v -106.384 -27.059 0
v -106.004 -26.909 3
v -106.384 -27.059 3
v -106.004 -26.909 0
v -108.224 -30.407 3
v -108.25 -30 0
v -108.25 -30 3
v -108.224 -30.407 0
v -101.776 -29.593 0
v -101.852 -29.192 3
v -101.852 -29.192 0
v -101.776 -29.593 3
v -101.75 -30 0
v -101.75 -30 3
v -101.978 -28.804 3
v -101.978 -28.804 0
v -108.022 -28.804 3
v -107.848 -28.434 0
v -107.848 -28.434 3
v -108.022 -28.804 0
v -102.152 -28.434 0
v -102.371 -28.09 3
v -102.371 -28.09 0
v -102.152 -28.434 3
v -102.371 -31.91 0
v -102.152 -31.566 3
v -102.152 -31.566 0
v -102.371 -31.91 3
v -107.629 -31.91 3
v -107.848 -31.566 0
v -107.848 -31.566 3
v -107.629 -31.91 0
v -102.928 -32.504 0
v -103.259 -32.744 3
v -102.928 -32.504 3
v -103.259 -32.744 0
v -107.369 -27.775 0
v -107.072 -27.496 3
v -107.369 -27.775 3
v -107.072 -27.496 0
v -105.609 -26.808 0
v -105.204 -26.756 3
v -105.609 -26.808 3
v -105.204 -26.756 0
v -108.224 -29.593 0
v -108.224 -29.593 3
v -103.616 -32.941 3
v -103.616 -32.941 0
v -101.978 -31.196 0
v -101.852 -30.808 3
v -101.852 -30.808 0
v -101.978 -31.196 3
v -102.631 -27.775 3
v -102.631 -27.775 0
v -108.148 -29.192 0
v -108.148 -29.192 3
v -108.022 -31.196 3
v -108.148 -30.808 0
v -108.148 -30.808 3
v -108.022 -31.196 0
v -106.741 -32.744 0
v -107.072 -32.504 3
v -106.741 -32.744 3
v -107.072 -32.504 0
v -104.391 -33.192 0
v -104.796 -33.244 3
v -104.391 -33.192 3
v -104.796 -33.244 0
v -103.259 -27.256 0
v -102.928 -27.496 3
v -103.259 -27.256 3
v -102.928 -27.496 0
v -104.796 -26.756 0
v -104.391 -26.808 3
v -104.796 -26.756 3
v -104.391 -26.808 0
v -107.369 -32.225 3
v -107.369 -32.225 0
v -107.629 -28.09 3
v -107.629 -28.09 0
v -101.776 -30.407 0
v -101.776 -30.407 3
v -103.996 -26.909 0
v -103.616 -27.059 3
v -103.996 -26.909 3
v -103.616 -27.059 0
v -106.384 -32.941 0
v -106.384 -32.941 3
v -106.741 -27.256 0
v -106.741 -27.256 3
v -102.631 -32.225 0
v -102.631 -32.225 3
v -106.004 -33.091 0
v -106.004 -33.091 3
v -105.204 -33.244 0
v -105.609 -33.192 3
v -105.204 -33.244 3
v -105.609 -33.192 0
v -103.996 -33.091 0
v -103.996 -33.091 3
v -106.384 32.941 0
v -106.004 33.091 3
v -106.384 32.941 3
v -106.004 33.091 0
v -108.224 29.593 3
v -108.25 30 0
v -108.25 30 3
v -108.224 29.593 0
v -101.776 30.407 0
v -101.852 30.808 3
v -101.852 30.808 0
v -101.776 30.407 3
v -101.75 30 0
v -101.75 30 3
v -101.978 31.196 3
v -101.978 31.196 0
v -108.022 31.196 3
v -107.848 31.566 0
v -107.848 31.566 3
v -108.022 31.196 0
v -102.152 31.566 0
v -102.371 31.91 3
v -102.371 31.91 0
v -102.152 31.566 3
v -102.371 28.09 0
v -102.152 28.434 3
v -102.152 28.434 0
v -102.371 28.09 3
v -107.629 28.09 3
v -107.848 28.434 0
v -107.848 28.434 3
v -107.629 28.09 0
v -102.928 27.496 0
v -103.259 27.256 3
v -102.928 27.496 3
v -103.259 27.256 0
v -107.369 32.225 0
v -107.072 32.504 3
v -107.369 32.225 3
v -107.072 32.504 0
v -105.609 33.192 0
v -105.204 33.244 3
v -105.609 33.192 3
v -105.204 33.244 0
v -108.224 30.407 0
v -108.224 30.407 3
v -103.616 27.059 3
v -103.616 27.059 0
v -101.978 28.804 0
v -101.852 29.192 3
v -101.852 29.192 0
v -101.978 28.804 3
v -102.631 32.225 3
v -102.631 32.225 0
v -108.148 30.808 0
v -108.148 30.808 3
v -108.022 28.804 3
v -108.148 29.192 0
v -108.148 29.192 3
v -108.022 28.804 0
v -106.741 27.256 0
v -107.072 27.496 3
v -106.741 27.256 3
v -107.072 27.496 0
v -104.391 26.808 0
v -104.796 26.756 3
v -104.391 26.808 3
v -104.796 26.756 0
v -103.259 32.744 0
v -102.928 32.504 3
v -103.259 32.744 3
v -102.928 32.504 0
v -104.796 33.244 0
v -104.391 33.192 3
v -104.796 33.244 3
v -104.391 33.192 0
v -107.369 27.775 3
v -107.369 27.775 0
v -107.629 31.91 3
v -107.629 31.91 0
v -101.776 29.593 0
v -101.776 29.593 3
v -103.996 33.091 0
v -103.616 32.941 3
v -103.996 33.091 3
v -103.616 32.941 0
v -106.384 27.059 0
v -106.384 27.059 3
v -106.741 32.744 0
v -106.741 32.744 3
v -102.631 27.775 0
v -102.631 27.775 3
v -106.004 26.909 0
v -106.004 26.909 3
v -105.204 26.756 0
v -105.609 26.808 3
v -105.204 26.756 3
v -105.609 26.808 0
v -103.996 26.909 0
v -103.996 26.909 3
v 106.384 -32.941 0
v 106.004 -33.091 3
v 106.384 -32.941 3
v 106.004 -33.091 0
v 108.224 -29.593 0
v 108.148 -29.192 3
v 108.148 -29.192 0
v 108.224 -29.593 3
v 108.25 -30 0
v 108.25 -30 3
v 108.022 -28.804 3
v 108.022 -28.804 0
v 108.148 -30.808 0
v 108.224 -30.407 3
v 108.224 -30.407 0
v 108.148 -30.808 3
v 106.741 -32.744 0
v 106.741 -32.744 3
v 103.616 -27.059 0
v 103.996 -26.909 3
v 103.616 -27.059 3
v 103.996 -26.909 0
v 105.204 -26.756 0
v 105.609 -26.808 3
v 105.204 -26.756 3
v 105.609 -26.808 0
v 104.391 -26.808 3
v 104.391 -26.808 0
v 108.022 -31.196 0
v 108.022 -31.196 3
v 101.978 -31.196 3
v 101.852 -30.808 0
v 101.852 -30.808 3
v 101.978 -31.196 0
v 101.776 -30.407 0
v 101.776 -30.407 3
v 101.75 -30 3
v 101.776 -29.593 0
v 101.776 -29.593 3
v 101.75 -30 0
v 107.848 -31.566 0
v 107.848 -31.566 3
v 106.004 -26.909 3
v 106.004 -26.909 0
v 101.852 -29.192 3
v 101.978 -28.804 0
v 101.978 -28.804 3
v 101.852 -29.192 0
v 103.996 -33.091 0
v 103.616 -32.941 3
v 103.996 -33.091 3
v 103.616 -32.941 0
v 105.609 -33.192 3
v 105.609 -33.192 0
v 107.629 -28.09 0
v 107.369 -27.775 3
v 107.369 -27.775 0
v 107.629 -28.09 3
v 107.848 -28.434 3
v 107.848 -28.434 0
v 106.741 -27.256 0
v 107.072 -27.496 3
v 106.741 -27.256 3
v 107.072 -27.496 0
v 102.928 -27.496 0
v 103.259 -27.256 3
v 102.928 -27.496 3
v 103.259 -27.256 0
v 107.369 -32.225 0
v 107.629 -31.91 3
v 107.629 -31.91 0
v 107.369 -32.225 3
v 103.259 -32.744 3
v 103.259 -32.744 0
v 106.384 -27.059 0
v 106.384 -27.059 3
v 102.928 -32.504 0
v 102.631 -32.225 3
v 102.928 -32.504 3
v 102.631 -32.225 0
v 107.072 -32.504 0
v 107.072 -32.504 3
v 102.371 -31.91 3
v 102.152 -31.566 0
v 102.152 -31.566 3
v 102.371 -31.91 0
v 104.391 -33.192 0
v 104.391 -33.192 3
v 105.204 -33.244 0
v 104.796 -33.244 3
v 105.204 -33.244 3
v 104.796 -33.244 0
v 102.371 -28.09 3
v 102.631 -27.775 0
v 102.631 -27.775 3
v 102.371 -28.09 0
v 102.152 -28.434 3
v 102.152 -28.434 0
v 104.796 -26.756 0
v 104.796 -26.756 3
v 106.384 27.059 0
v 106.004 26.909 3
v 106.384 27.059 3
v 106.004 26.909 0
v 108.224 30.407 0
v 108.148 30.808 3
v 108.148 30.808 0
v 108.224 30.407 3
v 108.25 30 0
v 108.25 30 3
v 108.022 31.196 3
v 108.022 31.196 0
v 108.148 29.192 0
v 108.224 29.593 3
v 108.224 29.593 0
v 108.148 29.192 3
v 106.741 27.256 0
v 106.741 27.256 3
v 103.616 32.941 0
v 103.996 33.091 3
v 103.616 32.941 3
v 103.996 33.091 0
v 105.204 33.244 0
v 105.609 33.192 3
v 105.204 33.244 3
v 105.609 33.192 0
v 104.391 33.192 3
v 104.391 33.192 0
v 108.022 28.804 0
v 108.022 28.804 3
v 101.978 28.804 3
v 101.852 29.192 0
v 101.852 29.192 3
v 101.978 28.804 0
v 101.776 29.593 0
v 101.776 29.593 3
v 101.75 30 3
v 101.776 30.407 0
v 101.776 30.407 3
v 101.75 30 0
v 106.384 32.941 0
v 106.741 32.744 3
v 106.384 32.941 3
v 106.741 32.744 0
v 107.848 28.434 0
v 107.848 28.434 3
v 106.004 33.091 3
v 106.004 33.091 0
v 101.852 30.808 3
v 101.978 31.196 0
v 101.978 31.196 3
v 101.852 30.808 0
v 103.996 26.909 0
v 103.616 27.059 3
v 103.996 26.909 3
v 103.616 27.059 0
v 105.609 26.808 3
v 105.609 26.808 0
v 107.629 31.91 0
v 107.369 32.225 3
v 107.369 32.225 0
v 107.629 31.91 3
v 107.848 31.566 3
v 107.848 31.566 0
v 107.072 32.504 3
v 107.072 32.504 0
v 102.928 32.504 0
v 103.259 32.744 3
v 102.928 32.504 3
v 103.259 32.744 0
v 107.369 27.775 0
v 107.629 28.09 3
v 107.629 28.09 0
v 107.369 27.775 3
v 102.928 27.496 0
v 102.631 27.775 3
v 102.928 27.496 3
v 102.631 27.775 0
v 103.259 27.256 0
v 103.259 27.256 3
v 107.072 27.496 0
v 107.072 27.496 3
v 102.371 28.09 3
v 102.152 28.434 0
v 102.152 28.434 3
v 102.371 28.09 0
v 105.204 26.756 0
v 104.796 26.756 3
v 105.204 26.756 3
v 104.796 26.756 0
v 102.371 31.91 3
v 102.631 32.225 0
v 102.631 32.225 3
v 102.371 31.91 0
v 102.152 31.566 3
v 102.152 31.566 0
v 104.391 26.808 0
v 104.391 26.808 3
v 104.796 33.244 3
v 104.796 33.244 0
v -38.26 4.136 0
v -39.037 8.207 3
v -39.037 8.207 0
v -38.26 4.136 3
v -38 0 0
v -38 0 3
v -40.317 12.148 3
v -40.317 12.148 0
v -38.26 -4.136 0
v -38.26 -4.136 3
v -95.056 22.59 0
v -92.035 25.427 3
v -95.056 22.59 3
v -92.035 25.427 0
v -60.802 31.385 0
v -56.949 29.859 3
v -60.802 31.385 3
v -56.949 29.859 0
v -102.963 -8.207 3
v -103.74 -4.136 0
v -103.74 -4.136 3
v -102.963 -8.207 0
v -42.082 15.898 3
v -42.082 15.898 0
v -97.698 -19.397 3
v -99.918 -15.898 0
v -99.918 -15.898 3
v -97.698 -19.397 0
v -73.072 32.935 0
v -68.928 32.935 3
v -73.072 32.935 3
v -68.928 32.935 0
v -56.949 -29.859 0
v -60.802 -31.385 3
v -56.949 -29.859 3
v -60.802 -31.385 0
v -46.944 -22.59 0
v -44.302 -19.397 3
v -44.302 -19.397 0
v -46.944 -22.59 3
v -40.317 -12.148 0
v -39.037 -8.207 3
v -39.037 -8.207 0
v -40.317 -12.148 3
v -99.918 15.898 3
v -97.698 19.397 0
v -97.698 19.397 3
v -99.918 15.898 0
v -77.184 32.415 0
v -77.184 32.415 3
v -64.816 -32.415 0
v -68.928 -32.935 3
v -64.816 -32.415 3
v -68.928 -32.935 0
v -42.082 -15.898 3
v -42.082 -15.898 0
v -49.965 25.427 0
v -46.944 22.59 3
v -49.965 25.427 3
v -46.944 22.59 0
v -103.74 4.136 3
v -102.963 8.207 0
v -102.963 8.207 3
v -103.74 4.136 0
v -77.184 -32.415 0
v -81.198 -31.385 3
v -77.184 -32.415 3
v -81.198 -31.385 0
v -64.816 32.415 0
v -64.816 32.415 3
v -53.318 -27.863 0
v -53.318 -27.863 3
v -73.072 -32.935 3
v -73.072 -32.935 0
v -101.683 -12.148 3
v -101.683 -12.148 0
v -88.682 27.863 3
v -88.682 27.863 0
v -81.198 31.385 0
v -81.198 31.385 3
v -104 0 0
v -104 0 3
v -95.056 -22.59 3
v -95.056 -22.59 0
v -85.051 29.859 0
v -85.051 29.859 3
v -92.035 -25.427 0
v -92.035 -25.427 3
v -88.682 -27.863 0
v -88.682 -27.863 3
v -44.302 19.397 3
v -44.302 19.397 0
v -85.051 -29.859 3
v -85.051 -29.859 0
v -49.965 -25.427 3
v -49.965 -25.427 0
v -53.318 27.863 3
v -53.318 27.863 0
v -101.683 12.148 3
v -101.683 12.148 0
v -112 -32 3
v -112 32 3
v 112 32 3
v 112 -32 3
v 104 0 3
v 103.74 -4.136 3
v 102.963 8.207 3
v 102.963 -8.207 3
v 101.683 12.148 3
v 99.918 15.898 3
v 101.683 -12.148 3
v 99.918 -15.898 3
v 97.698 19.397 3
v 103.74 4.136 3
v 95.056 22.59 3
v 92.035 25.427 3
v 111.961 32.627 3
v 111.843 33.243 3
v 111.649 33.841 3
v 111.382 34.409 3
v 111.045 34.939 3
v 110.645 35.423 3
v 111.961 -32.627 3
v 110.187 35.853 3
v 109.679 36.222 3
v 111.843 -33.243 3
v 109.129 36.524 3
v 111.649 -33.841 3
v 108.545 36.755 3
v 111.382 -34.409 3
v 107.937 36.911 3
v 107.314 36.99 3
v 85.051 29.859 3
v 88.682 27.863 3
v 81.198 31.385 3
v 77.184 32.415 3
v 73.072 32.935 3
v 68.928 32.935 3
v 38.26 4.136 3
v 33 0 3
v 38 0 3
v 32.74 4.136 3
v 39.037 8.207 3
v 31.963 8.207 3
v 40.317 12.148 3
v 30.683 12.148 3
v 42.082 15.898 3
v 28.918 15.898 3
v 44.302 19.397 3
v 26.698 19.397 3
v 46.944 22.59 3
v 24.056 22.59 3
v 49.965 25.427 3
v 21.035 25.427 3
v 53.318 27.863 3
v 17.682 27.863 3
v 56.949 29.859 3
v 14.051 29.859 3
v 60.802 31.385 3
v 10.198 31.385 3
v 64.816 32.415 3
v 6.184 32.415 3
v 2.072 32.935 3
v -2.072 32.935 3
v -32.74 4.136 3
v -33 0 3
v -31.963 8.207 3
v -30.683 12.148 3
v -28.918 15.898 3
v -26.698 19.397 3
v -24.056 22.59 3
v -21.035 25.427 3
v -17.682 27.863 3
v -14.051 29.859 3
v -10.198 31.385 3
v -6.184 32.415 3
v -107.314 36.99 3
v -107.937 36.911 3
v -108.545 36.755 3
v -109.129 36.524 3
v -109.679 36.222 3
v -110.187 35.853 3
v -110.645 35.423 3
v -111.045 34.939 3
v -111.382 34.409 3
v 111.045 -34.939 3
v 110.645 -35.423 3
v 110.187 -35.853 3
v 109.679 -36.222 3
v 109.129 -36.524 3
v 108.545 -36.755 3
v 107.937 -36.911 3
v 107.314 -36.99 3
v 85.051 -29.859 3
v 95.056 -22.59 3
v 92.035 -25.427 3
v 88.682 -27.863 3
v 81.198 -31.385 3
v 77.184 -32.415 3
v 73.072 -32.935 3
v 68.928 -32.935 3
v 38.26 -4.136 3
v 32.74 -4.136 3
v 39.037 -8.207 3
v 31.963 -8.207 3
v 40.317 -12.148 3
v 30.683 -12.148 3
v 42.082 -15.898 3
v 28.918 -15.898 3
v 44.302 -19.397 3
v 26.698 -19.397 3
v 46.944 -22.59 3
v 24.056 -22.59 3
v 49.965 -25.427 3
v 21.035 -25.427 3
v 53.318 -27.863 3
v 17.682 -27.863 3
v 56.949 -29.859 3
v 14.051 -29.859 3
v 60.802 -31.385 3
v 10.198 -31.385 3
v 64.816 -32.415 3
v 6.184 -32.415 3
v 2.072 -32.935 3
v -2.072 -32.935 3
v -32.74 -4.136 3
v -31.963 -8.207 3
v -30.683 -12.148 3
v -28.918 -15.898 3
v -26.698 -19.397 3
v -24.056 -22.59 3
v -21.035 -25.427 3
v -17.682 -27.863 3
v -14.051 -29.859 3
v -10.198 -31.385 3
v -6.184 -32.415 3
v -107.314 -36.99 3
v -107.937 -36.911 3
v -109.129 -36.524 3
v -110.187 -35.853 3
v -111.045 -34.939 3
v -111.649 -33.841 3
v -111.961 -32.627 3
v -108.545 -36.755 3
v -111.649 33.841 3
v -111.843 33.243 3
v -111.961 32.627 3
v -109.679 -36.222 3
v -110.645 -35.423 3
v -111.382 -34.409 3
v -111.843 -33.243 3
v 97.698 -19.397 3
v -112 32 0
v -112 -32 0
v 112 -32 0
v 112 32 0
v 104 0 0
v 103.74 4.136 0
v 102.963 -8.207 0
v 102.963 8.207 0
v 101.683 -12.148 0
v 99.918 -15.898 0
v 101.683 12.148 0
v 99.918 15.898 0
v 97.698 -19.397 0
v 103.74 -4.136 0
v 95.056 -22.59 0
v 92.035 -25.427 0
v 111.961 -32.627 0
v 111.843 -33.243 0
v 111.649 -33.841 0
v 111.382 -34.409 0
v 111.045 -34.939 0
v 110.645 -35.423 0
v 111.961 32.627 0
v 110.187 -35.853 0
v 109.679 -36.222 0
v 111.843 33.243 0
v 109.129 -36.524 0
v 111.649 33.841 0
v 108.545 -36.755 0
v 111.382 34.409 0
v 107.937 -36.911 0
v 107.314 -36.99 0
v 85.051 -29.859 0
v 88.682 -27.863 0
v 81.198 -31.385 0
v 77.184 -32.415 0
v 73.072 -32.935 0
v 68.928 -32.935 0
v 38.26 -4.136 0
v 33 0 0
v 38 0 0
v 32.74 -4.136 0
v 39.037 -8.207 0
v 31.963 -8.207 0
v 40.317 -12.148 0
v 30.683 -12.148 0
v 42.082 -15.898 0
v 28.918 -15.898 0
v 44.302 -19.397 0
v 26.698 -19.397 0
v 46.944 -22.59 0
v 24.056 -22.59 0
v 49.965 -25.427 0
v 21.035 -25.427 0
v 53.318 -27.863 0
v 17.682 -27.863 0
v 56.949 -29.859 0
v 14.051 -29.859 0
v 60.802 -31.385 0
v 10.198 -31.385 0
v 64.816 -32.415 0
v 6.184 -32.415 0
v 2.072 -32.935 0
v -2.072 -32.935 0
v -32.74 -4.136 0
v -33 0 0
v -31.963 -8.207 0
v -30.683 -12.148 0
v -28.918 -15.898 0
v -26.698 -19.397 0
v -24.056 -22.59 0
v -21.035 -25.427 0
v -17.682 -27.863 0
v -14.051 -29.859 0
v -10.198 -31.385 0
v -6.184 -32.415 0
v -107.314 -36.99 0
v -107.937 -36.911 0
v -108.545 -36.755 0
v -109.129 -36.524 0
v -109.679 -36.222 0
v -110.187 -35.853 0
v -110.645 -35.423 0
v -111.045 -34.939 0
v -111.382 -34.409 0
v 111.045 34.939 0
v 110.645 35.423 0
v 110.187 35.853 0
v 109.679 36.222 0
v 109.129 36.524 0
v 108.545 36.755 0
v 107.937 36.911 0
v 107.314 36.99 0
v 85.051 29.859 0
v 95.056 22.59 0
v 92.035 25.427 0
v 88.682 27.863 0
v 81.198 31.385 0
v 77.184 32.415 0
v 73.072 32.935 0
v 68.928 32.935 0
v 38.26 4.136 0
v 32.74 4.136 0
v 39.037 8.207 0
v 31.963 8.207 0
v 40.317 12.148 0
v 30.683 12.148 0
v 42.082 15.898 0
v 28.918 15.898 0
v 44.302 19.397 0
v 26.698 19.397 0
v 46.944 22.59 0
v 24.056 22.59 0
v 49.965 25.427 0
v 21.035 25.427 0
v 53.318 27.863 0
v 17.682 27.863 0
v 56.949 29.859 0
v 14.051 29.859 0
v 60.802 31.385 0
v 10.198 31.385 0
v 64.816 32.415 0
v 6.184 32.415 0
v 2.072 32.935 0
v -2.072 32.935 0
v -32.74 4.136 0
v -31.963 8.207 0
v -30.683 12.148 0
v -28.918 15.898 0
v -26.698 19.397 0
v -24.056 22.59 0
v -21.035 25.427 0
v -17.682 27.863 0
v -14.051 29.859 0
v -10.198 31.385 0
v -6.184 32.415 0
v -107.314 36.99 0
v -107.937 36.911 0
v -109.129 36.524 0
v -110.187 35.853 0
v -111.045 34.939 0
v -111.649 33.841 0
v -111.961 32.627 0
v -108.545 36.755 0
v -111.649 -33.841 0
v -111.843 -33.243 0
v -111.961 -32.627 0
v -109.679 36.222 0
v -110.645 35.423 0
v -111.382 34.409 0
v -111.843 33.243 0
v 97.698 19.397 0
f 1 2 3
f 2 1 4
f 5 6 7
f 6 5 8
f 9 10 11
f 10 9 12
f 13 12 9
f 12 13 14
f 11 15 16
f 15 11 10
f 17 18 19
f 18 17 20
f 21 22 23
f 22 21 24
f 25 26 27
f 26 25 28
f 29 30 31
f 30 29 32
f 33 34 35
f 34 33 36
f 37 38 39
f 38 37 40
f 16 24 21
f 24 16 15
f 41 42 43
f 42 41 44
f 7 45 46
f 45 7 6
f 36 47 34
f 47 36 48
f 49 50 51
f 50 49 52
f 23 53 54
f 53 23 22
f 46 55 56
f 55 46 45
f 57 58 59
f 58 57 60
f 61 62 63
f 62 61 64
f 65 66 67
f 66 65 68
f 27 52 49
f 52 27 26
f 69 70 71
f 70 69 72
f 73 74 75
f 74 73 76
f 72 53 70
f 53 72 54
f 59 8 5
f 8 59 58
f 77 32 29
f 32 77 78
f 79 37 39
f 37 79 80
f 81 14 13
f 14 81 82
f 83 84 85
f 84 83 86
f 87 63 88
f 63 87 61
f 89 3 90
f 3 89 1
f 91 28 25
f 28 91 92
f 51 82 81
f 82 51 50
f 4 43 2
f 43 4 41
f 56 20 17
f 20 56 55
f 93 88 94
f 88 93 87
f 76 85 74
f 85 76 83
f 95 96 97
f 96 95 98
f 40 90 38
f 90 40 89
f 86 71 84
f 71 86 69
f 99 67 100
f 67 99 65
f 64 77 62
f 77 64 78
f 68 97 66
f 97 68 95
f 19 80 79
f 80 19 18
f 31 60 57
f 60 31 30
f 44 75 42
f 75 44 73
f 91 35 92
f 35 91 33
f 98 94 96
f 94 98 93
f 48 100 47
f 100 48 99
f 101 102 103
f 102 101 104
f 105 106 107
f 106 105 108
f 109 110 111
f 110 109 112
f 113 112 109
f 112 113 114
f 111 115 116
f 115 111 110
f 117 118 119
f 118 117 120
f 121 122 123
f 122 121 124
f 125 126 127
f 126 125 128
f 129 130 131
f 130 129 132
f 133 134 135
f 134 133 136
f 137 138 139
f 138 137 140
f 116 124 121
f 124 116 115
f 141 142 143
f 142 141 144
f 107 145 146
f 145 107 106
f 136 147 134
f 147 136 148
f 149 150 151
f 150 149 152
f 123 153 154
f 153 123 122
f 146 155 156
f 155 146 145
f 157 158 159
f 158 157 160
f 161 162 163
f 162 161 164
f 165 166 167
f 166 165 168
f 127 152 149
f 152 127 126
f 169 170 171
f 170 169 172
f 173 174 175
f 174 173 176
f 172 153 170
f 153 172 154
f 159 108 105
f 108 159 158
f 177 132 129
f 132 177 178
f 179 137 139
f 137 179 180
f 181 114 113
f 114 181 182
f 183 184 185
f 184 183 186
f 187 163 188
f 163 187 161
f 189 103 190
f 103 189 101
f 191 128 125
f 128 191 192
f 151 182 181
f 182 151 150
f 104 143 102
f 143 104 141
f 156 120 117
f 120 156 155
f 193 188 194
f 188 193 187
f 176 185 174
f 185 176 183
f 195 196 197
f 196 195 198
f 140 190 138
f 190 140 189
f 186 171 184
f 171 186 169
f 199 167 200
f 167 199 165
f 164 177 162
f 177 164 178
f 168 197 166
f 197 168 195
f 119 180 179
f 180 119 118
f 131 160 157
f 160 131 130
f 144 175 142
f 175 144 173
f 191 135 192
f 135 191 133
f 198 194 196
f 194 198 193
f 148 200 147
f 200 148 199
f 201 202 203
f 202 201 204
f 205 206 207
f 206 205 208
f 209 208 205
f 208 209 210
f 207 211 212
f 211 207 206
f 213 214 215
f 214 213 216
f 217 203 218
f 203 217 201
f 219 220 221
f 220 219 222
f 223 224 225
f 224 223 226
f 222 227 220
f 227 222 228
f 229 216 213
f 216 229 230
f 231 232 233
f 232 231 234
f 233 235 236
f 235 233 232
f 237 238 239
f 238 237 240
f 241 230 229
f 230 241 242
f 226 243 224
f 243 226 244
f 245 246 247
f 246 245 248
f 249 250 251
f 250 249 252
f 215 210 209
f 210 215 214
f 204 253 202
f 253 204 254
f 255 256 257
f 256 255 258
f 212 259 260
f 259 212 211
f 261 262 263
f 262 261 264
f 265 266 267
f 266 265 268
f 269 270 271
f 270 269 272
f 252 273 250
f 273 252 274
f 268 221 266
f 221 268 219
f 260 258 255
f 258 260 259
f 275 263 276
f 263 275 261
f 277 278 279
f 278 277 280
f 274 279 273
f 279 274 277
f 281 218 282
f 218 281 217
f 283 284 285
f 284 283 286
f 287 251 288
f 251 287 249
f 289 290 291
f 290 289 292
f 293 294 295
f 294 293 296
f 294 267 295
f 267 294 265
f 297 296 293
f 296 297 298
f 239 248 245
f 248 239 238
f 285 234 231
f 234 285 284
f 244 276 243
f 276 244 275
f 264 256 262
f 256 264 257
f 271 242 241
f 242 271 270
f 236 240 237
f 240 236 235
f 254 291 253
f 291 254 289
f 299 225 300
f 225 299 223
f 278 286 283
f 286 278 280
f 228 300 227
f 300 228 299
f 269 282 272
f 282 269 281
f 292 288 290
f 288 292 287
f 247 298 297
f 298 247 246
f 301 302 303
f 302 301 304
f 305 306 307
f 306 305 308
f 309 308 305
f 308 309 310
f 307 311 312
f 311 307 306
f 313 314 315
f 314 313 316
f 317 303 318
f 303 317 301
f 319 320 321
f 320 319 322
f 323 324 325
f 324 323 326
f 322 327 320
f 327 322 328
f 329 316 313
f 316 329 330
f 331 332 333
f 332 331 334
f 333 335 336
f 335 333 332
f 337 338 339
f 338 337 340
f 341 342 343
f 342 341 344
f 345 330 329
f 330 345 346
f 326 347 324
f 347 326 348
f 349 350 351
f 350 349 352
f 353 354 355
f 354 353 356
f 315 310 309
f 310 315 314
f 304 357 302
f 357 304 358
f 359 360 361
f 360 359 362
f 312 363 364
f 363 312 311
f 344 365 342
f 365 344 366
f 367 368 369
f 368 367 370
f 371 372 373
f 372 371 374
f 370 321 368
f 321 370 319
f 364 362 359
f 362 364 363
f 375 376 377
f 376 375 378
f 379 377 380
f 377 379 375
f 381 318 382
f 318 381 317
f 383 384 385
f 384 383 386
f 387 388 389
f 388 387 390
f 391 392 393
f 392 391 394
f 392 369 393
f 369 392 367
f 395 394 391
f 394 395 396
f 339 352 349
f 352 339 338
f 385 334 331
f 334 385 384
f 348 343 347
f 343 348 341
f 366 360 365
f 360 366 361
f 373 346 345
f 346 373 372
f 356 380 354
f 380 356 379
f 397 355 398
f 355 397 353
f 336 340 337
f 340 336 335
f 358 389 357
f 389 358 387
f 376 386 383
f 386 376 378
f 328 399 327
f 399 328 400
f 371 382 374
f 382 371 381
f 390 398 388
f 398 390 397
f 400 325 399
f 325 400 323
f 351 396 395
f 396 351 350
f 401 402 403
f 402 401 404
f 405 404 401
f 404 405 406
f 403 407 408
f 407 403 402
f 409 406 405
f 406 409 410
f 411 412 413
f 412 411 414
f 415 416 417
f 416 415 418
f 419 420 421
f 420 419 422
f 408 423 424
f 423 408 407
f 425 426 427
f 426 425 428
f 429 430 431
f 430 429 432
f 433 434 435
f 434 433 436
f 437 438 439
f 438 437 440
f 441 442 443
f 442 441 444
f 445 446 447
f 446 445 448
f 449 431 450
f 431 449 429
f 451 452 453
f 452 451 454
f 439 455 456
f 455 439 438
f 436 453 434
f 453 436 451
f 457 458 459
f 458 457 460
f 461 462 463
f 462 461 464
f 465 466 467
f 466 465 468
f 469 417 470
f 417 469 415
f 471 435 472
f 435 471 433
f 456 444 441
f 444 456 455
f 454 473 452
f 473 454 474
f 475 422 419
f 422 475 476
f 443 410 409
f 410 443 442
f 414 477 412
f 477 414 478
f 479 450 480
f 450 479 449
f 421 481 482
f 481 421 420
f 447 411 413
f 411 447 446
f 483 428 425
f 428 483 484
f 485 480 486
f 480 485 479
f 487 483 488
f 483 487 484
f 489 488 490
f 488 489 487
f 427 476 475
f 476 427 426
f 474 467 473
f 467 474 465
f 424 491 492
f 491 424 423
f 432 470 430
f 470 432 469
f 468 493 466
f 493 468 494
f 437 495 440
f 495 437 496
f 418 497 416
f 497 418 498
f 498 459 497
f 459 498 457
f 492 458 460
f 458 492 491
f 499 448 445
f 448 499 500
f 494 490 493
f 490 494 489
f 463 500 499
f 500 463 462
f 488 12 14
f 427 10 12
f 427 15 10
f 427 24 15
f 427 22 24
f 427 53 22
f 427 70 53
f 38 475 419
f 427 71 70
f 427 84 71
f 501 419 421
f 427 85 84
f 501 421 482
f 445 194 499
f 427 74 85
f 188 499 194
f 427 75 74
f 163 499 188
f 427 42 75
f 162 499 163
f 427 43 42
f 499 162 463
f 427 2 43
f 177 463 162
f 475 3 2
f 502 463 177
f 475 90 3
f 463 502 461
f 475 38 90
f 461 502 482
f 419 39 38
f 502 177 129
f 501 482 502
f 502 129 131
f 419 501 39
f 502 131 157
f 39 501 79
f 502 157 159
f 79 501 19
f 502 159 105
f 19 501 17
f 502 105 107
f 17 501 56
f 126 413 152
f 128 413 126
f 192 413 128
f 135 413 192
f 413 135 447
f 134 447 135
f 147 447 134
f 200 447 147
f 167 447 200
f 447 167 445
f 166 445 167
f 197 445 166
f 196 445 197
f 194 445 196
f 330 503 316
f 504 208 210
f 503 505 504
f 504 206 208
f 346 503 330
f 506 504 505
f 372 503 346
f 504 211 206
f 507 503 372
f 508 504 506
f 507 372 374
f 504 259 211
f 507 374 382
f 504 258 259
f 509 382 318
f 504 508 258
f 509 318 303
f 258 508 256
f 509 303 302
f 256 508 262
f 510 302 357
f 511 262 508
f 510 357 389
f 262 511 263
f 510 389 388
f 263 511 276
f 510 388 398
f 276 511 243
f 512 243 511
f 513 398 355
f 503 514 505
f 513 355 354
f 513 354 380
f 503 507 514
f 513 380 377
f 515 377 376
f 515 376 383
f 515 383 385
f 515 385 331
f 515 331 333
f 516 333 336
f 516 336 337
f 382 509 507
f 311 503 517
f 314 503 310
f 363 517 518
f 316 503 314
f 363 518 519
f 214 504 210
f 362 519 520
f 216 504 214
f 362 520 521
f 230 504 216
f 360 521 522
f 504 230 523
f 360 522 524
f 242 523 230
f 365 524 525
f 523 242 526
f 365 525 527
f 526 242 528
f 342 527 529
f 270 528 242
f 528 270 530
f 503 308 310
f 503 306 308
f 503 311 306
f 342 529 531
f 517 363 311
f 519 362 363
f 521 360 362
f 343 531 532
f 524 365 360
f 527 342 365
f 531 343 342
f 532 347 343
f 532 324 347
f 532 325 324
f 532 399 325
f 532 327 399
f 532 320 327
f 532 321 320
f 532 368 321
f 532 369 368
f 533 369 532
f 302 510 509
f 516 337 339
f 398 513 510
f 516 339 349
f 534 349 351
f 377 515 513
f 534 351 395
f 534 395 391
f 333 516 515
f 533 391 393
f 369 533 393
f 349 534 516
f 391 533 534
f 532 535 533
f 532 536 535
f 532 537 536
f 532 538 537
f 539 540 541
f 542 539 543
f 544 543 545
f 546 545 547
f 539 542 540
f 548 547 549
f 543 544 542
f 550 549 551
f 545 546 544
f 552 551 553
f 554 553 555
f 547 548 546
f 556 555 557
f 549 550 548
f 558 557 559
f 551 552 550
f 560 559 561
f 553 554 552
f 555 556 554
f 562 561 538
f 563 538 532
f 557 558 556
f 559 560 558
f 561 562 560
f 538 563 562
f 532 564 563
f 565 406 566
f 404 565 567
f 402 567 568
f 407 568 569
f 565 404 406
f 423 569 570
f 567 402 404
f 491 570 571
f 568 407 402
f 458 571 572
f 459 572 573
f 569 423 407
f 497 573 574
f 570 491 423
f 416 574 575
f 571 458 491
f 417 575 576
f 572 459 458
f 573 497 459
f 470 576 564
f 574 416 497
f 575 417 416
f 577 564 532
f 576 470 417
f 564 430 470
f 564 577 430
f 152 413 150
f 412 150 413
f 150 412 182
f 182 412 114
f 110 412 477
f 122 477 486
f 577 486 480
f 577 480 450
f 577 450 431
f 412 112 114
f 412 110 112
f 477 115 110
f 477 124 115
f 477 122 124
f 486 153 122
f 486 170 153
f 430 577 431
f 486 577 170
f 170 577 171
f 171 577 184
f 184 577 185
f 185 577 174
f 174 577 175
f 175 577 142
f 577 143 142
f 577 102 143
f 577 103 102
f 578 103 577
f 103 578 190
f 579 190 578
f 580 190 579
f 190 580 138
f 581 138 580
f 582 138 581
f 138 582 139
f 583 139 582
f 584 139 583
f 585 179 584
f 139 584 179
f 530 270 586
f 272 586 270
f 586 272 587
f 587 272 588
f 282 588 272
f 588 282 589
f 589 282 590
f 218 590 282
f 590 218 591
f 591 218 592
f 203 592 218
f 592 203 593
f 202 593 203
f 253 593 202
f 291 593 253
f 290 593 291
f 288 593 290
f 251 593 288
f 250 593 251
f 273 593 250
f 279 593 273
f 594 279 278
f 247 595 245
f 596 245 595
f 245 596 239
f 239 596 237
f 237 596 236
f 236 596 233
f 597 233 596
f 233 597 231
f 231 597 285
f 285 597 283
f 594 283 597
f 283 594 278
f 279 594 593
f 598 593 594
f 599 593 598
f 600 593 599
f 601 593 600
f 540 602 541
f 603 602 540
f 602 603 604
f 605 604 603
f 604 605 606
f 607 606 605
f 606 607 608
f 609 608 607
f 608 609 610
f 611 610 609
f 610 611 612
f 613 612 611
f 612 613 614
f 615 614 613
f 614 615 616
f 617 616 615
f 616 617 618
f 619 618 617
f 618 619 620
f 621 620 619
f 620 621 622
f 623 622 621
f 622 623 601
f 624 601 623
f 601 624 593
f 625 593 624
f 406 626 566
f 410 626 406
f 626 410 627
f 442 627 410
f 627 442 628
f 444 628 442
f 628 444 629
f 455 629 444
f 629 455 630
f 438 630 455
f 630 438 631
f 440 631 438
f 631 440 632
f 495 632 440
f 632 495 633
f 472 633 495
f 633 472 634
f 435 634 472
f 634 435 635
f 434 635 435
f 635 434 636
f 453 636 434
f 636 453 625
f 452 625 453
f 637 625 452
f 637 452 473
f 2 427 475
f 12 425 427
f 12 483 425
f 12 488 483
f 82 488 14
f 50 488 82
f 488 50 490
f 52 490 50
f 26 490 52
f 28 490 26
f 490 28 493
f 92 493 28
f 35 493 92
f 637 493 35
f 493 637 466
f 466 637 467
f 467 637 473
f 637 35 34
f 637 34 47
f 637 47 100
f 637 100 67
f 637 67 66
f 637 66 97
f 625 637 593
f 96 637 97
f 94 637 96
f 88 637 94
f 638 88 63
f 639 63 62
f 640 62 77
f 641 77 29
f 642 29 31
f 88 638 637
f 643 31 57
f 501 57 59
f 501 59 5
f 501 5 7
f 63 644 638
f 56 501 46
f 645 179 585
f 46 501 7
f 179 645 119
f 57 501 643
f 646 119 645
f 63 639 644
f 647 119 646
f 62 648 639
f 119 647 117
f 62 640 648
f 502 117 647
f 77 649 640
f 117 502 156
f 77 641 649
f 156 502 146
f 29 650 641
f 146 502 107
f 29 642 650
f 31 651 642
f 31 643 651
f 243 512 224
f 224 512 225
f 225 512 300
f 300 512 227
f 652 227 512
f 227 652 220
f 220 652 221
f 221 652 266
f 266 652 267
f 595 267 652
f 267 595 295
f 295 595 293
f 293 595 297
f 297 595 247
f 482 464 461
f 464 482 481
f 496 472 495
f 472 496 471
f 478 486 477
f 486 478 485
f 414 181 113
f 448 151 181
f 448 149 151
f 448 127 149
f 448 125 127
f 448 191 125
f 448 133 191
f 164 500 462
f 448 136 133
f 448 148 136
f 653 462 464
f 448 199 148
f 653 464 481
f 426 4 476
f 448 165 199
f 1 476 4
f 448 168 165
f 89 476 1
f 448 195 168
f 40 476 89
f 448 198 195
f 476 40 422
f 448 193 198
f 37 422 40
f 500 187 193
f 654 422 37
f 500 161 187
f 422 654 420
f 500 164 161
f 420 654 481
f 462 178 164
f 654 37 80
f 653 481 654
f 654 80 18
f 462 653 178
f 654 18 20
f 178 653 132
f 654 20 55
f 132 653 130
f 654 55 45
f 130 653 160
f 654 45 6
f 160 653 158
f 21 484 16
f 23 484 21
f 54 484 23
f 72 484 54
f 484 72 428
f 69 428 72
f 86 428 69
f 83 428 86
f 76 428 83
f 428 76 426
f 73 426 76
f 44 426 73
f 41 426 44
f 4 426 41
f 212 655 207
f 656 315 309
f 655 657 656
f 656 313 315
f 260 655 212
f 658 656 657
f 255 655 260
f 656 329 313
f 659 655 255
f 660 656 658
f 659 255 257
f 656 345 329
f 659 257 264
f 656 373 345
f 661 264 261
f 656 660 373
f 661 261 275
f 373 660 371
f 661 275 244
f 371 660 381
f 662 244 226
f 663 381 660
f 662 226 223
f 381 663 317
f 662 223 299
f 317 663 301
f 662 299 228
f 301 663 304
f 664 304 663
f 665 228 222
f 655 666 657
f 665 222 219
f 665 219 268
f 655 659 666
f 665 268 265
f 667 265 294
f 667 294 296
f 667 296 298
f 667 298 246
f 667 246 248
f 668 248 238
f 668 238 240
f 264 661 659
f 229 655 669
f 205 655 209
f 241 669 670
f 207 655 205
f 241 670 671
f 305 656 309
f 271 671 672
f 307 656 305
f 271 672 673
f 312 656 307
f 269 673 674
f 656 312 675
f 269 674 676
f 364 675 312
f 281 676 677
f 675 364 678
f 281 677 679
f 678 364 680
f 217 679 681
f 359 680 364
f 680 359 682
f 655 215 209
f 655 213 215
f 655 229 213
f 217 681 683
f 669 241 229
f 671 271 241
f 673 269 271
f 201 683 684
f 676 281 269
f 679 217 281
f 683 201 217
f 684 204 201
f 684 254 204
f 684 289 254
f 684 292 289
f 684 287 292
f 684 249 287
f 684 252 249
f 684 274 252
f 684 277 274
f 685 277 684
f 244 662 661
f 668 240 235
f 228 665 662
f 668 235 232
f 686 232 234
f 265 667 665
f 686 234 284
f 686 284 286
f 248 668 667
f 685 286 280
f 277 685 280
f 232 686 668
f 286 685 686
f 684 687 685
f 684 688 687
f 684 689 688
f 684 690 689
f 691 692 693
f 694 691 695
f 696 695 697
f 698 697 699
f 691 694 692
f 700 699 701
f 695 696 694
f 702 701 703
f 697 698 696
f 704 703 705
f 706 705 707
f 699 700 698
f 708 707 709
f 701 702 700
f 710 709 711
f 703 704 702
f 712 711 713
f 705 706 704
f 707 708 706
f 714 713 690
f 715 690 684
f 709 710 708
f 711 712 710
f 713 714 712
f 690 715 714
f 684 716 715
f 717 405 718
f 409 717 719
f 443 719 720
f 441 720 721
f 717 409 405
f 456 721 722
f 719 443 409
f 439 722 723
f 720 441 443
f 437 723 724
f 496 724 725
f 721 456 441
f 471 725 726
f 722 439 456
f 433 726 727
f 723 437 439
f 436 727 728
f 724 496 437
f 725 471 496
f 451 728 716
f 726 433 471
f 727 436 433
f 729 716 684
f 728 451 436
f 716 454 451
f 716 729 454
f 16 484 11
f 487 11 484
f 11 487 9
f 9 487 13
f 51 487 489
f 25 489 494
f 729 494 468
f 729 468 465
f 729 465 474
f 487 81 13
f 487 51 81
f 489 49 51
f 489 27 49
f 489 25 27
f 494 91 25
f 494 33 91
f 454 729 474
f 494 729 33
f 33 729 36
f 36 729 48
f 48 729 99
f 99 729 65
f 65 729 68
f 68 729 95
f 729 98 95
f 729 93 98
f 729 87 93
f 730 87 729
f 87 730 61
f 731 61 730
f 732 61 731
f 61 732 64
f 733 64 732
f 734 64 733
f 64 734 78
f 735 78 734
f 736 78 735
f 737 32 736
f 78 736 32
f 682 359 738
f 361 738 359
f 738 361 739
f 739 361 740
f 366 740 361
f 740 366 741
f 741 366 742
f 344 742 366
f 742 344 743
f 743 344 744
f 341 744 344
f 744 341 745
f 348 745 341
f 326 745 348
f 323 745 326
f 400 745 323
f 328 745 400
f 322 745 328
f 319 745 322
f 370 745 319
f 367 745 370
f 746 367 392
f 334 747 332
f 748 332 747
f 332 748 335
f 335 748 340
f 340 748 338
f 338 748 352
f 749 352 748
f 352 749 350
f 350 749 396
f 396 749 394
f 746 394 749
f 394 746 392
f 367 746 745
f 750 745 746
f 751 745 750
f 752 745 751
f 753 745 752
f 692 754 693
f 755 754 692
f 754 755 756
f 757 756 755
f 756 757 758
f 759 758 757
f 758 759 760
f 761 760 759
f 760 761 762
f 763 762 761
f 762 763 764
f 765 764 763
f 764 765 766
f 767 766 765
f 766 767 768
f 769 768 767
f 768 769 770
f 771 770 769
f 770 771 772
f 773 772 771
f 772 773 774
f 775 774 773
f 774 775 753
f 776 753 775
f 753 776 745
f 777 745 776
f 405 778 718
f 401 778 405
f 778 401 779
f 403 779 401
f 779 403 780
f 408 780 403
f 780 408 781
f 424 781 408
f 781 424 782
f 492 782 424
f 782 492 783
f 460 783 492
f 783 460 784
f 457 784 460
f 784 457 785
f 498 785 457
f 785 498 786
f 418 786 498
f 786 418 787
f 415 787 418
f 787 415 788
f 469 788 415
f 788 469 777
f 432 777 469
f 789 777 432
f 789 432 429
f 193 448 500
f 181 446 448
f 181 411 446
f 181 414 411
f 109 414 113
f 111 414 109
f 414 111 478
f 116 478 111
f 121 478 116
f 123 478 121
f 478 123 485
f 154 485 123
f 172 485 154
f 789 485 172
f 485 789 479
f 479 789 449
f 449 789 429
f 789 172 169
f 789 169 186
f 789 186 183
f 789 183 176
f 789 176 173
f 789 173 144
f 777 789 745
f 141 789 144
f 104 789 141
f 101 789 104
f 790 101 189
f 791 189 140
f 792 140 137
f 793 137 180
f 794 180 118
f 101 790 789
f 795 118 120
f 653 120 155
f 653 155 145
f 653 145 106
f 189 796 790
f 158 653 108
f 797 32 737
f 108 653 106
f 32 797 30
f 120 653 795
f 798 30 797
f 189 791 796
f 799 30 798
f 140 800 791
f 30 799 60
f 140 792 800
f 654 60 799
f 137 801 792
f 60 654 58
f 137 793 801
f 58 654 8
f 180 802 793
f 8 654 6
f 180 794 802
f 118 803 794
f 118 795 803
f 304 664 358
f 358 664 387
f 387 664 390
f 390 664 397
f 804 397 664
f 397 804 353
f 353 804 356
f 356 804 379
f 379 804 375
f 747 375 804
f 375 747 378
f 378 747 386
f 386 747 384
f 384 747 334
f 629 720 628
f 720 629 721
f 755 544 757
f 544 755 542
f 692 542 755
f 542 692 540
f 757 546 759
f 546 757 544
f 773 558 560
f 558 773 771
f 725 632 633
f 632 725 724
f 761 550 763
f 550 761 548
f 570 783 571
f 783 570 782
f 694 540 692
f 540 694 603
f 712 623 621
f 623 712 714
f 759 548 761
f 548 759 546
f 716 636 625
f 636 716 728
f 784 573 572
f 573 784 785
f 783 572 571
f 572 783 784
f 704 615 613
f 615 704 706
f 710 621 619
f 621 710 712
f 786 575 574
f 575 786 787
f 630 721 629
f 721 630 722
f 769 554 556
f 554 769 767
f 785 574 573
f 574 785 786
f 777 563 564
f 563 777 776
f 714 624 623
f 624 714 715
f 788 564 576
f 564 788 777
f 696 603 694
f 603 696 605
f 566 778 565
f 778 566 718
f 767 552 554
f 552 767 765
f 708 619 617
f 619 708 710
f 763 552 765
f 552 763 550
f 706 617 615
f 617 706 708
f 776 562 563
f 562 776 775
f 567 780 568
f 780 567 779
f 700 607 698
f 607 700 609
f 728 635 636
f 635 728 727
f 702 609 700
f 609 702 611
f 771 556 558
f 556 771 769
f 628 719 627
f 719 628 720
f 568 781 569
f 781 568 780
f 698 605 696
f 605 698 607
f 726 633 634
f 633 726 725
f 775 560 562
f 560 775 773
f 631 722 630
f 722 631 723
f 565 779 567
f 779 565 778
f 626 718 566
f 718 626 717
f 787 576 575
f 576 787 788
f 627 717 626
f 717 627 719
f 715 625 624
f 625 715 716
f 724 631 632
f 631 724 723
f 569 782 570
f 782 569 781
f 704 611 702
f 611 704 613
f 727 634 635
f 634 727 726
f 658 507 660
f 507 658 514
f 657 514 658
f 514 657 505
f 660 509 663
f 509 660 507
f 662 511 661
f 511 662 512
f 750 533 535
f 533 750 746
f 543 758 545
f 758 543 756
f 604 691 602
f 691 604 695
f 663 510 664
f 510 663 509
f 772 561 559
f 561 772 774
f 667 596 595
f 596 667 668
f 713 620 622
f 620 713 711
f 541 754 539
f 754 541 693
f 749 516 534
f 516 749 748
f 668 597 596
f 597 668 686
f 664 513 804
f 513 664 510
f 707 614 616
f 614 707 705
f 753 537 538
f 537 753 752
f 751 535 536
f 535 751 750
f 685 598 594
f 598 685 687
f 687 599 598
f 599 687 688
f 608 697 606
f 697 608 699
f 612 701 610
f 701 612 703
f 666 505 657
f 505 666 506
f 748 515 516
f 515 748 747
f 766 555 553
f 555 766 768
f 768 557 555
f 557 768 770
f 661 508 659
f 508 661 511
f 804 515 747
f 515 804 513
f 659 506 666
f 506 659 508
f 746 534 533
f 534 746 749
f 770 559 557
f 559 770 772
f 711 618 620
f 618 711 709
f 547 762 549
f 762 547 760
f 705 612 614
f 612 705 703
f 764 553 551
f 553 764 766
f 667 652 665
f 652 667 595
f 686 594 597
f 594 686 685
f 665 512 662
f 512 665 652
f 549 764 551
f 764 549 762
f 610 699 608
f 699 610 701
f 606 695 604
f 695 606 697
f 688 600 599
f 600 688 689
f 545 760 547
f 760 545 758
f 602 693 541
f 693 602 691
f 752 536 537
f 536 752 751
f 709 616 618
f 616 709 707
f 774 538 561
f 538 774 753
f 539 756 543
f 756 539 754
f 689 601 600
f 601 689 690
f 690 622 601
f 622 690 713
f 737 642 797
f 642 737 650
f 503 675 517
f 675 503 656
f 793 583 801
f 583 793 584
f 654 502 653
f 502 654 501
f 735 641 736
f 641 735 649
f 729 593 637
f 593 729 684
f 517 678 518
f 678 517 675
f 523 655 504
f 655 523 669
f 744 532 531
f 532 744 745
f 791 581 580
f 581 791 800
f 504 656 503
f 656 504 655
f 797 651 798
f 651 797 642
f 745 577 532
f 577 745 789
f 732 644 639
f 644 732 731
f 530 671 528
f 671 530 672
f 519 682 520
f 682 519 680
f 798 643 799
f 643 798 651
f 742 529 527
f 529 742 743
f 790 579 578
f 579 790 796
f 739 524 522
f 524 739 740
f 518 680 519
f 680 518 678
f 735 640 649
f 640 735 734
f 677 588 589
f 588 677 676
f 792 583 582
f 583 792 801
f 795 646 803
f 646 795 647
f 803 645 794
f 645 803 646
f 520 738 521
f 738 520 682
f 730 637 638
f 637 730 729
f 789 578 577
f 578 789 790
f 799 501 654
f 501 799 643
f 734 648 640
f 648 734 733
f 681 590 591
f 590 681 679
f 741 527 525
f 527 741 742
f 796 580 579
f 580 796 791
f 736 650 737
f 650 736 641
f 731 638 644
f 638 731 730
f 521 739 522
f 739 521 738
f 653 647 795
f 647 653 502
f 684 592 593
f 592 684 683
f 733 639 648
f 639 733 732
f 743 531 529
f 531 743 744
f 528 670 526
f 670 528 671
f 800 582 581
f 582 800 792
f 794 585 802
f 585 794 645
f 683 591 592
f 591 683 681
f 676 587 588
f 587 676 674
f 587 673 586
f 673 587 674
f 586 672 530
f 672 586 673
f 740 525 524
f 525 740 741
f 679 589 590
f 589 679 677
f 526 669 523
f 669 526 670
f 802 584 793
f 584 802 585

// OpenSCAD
$fn = 50;


difference() {
	union() {
		hull() {
			translate(v = [-107.0000000000, 32.0000000000, 0]) {
				cylinder(h = 3, r = 5);
			}
			translate(v = [107.0000000000, 32.0000000000, 0]) {
				cylinder(h = 3, r = 5);
			}
			translate(v = [-107.0000000000, -32.0000000000, 0]) {
				cylinder(h = 3, r = 5);
			}
			translate(v = [107.0000000000, -32.0000000000, 0]) {
				cylinder(h = 3, r = 5);
			}
		}
	}
	union() {
		#translate(v = [-105.0000000000, -30.0000000000, -100.0000000000]) {
			cylinder(h = 200, r = 3.2500000000);
		}
		#translate(v = [-105.0000000000, 30.0000000000, -100.0000000000]) {
			cylinder(h = 200, r = 3.2500000000);
		}
		#translate(v = [105.0000000000, -30.0000000000, -100.0000000000]) {
			cylinder(h = 200, r = 3.2500000000);
		}
		#translate(v = [105.0000000000, 30.0000000000, -100.0000000000]) {
			cylinder(h = 200, r = 3.2500000000);
		}
		#translate(v = [-71.0000000000, 0, 0]) {
			cylinder(h = 3, r = 33.0000000000);
		}
		#cylinder(h = 3, r = 33.0000000000);
		#translate(v = [71.0000000000, 0, 0]) {
			cylinder(h = 3, r = 33.0000000000);
		}
	}
}
